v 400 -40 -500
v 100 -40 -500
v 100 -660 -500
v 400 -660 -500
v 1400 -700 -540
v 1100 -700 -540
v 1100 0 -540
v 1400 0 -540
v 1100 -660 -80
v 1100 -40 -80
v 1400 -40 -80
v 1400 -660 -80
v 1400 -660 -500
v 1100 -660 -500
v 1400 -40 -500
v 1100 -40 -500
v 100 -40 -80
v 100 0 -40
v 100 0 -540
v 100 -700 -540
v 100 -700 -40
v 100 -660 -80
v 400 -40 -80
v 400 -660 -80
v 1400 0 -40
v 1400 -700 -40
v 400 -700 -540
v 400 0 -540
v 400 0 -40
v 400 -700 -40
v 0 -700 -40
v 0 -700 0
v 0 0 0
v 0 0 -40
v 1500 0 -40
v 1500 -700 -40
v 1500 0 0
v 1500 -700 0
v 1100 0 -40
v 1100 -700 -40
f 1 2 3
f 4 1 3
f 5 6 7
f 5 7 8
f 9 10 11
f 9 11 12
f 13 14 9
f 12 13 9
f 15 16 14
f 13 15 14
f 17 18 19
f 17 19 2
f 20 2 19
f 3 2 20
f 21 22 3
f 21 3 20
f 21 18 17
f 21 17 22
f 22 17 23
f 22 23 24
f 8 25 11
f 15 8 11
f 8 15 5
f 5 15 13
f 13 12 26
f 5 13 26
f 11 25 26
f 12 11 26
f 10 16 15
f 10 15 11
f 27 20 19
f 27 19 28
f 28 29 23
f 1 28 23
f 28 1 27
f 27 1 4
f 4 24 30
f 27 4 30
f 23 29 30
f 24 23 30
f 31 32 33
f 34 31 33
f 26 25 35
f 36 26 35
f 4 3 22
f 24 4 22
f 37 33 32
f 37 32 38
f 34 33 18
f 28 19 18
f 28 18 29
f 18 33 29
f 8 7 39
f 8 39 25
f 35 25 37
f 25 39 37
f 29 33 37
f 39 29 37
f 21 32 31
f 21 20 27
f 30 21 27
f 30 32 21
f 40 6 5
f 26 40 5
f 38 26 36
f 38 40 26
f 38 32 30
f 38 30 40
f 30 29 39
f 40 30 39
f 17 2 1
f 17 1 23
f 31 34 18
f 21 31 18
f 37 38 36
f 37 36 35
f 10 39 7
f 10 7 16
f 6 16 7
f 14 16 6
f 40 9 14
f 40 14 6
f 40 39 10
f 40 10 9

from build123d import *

# Parameters (mm, degrees)
F0_W     = 1500
F0_H     = 700
F1_DEPTH = 40
F2_W     = 300
F2_H     = 700
F3_DEPTH = 500
F4_W     = 620
F4_H     = 420
F5_DEPTH = 1328


with BuildPart() as f1:
    # F0 (on Top) → F1 (new body)
    with BuildSketch(Plane.XY):
        with Locations((750, -350)):
            Rectangle(F0_W, F0_H)
    extrude(amount=-F1_DEPTH)

    # F2 (on face) → F3 (join)
    with BuildSketch(Plane(origin=(0, 0, -40), x_dir=(1, 0, 0), z_dir=(0, 0, -1))):
        with Locations((250, 350)):
            Rectangle(F2_W, F2_H)
        with Locations((1250, 350)):
            Rectangle(F2_W, F2_H)
    extrude(amount=F3_DEPTH)

    # F4 (on face) → F5 (cut)
    with BuildSketch(Plane(origin=(100, 0, 0), x_dir=(0, -1, 0), z_dir=(-1, 0, 0))):
        with Locations((350, -290)):
            Rectangle(F4_W, F4_H)
    extrude(amount=-F5_DEPTH, mode=Mode.SUBTRACT)


solid = f1.part
